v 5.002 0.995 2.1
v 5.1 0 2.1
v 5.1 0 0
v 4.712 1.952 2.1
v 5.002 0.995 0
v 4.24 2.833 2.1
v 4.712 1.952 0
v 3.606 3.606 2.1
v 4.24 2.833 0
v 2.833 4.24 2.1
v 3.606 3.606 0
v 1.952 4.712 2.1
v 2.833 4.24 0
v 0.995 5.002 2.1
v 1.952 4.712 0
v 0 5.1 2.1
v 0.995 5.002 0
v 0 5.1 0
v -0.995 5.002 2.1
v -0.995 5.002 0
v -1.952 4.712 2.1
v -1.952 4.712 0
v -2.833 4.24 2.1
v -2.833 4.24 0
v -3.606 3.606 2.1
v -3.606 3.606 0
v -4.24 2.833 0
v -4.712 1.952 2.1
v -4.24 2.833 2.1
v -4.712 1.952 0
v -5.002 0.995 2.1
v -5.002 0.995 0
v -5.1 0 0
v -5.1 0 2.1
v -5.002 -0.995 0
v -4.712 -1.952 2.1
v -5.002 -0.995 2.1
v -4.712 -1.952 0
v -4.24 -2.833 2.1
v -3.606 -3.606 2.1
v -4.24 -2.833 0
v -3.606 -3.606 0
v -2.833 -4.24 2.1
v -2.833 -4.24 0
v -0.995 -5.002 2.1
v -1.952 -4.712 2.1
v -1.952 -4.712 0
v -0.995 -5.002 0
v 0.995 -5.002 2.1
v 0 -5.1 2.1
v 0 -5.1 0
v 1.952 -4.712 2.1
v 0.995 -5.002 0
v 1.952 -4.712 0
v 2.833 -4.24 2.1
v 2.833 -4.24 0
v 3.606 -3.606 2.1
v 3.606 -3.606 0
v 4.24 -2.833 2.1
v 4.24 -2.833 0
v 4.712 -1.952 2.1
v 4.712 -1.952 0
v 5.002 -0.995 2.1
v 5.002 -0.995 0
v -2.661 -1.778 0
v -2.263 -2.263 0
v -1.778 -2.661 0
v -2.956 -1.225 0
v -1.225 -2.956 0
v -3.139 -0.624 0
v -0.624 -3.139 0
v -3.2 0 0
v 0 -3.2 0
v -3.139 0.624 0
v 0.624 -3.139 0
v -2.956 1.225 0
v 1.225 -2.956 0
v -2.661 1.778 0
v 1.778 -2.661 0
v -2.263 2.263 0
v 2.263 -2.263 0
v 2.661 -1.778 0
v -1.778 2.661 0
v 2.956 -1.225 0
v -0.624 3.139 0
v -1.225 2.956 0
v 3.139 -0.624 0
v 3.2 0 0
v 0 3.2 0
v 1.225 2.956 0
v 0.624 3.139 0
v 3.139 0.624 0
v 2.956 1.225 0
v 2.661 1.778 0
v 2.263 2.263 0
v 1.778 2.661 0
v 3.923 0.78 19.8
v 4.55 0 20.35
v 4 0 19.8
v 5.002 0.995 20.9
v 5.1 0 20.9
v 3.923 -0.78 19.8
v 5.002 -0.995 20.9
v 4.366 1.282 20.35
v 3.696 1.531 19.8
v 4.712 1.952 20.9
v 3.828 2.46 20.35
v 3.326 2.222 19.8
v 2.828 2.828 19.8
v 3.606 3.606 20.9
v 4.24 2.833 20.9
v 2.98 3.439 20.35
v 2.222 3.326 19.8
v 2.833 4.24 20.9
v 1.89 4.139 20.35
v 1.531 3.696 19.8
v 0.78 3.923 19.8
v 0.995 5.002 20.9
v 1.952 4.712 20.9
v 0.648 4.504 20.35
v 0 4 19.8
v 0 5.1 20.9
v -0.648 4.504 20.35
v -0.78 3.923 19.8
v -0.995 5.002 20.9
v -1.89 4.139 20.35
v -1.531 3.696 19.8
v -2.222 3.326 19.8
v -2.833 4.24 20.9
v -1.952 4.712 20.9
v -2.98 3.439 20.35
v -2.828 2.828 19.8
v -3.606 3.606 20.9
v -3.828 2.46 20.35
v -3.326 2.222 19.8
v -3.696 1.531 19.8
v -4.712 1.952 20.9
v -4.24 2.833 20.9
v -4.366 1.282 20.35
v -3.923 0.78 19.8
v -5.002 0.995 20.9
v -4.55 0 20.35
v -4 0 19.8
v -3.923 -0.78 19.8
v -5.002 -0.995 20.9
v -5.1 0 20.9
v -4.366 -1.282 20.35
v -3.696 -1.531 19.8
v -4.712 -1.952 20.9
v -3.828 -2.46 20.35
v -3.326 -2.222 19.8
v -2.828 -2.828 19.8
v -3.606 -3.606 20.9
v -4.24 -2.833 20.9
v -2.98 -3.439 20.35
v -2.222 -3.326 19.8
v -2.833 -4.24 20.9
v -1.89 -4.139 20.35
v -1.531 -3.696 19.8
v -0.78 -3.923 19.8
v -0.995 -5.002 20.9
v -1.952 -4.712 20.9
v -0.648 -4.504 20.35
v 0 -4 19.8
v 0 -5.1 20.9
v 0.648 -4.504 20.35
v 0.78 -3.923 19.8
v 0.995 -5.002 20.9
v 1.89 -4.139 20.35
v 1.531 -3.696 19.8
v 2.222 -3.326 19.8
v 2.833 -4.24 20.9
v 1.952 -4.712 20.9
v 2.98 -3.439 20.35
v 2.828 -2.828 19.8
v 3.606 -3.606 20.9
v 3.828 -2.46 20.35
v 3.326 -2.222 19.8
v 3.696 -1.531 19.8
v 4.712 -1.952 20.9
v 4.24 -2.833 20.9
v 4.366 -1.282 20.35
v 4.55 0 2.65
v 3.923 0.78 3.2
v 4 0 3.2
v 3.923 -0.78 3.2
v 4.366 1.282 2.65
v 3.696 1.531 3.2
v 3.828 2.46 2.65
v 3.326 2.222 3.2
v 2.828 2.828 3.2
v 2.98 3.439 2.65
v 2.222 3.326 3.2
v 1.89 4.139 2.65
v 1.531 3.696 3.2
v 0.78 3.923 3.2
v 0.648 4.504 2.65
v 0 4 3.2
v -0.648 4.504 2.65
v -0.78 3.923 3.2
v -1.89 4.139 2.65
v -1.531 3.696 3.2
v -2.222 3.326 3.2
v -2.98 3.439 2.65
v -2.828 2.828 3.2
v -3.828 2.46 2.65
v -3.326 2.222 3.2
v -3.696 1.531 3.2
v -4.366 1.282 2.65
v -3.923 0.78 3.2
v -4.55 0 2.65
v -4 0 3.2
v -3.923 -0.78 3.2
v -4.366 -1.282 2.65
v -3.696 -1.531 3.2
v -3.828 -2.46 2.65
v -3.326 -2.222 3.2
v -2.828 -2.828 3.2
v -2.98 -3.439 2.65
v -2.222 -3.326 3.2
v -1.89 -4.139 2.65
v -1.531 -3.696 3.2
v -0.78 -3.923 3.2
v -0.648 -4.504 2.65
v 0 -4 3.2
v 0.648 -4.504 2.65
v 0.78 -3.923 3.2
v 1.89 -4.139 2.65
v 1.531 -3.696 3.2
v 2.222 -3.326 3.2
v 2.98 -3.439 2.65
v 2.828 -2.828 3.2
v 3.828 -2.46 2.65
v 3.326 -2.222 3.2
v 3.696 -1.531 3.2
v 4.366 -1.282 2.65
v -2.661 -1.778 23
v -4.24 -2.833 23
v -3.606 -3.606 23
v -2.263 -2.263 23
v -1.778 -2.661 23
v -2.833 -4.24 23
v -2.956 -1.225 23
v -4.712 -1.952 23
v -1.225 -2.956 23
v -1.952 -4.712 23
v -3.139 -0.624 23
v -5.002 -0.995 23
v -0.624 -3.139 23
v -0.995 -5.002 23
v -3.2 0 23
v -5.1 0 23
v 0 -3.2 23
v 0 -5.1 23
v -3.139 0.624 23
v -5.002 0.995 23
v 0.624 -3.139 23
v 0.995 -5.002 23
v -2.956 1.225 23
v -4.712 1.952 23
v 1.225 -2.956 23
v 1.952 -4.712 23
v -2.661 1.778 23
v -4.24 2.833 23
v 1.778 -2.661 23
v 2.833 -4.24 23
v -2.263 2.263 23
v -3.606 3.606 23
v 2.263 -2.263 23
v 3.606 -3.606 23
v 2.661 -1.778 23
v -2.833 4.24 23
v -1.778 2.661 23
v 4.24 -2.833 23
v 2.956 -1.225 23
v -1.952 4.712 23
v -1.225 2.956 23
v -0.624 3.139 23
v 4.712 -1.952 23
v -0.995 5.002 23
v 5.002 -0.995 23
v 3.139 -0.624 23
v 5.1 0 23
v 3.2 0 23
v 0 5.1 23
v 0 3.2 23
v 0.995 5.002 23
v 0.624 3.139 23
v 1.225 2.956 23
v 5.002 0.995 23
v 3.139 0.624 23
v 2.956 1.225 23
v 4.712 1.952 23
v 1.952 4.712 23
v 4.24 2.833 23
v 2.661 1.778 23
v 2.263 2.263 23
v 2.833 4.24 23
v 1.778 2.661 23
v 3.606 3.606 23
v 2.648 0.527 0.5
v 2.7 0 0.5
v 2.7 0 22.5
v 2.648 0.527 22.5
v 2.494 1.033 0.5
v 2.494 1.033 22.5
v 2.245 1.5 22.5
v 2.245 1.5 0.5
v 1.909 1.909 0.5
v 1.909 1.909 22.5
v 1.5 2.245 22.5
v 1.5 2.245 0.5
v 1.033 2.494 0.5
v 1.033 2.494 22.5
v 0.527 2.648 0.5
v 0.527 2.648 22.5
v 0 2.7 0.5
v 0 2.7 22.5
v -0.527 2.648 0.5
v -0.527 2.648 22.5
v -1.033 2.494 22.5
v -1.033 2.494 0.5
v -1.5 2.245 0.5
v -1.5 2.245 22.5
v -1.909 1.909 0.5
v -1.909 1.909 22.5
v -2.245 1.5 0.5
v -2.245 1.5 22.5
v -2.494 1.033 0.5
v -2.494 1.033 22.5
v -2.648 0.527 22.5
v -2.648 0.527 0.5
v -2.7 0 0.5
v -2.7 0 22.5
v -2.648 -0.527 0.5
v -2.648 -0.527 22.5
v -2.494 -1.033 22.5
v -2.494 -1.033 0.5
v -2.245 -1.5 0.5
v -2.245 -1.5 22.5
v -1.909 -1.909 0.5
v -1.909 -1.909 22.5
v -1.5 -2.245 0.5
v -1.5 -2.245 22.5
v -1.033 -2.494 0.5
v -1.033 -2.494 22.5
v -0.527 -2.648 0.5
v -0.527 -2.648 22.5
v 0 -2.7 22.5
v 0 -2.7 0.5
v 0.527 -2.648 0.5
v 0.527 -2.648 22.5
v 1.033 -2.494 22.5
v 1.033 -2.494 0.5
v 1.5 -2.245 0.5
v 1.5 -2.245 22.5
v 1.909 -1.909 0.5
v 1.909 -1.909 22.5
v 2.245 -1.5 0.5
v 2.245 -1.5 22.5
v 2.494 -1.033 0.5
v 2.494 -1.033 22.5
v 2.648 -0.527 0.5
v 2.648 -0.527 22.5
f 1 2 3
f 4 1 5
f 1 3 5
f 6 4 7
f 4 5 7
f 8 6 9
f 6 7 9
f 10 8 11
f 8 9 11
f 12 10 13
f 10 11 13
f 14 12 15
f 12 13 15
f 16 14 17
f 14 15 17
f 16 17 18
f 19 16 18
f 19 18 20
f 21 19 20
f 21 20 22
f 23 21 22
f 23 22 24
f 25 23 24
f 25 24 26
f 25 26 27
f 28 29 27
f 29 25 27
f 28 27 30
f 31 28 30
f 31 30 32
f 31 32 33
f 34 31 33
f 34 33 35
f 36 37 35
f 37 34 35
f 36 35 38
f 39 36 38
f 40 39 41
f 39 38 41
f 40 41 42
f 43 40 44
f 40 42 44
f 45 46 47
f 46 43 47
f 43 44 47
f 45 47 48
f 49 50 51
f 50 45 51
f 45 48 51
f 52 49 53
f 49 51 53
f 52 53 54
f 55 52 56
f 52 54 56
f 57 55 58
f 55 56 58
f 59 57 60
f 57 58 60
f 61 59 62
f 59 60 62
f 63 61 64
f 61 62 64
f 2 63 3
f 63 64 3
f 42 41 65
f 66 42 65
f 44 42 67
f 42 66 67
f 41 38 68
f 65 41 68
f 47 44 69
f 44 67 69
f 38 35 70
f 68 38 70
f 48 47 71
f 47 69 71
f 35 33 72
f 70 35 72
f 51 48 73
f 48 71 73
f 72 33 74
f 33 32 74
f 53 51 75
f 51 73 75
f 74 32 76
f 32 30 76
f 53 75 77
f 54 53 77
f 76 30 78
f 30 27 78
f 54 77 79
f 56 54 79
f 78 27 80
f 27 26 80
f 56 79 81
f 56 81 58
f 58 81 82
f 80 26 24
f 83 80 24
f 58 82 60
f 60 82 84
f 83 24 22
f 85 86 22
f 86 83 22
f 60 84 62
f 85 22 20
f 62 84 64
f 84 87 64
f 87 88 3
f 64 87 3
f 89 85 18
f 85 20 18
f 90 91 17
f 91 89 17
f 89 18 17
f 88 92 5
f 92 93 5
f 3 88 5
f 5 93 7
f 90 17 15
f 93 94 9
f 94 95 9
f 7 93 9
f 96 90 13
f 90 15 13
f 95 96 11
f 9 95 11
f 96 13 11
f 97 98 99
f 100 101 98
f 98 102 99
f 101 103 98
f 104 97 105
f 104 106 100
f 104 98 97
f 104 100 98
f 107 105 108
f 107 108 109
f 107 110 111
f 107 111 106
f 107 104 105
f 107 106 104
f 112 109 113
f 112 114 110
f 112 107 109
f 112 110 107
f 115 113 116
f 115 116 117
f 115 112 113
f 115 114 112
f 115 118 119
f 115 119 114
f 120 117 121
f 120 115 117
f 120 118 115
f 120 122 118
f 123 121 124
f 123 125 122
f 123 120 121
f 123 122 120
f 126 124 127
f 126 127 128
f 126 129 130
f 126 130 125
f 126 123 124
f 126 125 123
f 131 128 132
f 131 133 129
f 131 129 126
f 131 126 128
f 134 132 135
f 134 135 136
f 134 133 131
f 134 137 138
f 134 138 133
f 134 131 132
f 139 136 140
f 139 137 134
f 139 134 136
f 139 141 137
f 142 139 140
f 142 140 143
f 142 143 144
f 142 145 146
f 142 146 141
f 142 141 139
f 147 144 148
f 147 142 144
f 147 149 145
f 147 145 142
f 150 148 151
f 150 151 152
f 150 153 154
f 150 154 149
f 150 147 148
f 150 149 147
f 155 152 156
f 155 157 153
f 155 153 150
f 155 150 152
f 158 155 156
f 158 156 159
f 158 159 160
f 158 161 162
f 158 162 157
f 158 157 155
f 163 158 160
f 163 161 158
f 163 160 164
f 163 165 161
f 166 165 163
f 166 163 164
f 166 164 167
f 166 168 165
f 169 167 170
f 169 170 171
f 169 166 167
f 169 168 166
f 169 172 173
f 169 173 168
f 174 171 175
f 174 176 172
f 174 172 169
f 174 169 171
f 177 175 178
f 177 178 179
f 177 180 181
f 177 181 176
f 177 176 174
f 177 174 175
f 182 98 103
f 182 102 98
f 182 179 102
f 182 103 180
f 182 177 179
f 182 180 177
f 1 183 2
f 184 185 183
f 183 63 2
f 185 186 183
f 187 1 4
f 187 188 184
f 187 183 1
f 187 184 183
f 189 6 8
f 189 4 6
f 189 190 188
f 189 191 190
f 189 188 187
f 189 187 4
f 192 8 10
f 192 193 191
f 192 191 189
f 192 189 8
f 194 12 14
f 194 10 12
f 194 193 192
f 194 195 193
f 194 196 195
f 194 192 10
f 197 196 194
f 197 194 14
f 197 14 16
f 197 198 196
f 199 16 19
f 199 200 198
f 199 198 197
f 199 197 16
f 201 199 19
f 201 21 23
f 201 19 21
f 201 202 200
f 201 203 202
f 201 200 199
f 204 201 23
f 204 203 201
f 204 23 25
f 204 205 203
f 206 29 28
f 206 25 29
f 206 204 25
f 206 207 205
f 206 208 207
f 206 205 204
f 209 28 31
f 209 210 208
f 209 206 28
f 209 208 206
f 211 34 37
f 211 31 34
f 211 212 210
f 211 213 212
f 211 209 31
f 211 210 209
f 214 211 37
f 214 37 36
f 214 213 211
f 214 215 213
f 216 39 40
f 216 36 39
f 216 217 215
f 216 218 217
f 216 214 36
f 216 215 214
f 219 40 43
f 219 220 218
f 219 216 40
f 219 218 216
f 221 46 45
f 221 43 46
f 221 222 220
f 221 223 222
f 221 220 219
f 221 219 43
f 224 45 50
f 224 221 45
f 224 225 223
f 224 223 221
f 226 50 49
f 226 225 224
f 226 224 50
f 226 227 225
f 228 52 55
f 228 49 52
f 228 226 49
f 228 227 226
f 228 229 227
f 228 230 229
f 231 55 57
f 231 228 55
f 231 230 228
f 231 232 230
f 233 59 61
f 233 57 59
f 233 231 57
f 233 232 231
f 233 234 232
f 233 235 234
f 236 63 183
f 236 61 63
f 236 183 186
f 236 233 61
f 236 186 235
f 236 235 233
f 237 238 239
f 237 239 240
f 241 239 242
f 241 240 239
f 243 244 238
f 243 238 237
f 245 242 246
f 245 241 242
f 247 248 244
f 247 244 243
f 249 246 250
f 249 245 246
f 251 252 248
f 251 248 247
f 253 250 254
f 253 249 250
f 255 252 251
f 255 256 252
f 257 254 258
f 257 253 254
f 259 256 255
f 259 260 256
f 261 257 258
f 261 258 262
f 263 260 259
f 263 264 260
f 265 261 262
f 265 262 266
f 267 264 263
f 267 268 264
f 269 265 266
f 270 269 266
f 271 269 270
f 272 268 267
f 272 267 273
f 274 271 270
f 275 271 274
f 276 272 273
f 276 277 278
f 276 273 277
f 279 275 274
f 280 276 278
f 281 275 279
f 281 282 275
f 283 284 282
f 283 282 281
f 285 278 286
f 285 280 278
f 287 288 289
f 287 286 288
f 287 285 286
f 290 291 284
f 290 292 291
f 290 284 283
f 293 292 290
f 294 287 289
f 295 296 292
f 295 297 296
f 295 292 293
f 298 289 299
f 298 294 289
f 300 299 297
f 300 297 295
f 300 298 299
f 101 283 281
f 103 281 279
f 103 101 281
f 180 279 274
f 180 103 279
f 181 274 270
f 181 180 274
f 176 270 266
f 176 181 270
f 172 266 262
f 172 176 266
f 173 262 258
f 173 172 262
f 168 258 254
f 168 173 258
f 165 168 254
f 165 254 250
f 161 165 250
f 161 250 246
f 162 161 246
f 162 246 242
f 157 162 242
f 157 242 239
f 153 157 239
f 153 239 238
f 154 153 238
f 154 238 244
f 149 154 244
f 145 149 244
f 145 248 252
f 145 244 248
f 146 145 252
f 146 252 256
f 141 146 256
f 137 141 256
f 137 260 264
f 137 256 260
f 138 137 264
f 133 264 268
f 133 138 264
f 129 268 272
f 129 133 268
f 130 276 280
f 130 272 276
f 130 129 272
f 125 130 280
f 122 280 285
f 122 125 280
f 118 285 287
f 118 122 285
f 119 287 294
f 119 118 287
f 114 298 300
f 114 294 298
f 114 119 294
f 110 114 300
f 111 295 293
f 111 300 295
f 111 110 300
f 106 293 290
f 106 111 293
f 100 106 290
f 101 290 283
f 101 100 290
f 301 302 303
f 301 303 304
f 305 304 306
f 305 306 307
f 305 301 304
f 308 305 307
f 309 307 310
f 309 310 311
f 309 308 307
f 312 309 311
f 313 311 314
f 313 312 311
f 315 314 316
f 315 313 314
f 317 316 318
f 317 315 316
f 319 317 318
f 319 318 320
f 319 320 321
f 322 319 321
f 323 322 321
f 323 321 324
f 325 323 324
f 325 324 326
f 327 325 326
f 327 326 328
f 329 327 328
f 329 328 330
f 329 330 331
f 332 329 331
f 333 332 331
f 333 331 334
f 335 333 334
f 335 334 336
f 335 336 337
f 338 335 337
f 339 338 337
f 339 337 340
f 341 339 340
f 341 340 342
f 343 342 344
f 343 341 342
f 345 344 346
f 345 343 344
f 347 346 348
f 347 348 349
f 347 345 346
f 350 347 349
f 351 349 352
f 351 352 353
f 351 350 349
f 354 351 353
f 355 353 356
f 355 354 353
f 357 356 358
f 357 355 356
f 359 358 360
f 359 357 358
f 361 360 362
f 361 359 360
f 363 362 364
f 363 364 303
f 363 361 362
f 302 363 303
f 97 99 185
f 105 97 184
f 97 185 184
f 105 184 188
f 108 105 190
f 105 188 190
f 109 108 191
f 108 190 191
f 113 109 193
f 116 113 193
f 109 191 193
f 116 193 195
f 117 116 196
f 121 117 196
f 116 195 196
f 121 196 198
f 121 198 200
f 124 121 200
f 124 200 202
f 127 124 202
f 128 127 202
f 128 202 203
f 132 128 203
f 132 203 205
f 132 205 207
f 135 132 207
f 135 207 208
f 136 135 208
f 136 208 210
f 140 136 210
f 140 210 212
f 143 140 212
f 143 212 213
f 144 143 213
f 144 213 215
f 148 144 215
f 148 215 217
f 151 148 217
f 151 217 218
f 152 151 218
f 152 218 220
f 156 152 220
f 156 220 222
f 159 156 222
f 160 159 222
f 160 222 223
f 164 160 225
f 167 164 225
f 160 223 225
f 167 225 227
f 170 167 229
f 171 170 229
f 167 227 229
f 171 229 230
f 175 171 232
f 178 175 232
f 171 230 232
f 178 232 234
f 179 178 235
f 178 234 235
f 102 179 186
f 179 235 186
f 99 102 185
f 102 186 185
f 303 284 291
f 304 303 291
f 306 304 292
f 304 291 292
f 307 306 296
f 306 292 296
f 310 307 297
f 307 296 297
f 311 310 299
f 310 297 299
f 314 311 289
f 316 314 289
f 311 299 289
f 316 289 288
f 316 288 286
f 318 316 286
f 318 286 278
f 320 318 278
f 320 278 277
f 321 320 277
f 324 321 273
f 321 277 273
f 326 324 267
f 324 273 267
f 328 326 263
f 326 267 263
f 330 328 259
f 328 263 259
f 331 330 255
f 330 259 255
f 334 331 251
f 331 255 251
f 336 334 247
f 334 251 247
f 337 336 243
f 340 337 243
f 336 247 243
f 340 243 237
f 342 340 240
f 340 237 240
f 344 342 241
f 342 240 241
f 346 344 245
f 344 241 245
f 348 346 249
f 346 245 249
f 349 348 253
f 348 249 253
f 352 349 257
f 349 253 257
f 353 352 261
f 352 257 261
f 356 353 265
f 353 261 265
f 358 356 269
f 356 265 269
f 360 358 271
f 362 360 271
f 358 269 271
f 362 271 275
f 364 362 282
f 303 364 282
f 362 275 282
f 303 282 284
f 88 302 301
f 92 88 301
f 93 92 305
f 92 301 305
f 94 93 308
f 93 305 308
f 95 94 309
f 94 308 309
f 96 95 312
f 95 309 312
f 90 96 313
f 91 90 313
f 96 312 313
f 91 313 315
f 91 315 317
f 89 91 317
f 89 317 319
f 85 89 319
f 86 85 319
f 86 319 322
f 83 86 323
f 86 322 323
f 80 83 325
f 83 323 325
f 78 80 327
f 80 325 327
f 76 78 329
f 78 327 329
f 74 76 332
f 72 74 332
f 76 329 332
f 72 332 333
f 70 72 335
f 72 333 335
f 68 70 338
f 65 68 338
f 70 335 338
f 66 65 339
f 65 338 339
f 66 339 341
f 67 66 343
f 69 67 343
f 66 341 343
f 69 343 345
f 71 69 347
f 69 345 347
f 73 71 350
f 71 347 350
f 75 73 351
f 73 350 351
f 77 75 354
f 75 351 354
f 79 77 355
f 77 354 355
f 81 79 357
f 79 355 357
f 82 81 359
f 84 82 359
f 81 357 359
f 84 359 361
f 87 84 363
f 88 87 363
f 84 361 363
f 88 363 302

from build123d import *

# Parameters (mm, degrees)
SKETCH2_R           = 5.1
SKETCH2_R_2         = 2.7
BOSS_EXTRUDE1_DEPTH = 2
SKETCH3_R           = 4
SKETCH3_R_2         = 2.7
BOSS_EXTRUDE2_DEPTH = 19
SKETCH4_R           = 5.1
SKETCH4_R_2         = 2.7
BOSS_EXTRUDE3_DEPTH = 2
CHAMFER1_SIZE       = 1.2
CHAMFER2_SIZE       = 0.5


with BuildPart() as part:
    # Sketch2 → Boss-Extrude1 (new body)
    with BuildSketch(Plane.XY):
        Circle(SKETCH2_R)
        Circle(SKETCH2_R_2, mode=Mode.SUBTRACT)
    extrude(amount=BOSS_EXTRUDE1_DEPTH)

    # Sketch3 → Boss-Extrude2 (add)
    with BuildSketch(Plane.XY.offset(2)):
        Circle(SKETCH3_R)
        Circle(SKETCH3_R_2, mode=Mode.SUBTRACT)
    extrude(amount=BOSS_EXTRUDE2_DEPTH)

    # Sketch4 → Boss-Extrude3 (add)
    with BuildSketch(Plane.XY.offset(21)):
        Circle(SKETCH4_R)
        Circle(SKETCH4_R_2, mode=Mode.SUBTRACT)
    extrude(amount=BOSS_EXTRUDE3_DEPTH)

    # Chamfer1
    # the kernel refuses this chamfer: 1.2 mm, written as the material it adds along each edge
    with BuildSketch(Plane(origin=(0, 0, 21), x_dir=(1, 0, 0), z_dir=(0, -1, 0))) as chamfer1_piece_1_section:
        Polygon((4, -CHAMFER1_SIZE), (4 + CHAMFER1_SIZE, 0), (4, 0), align=None)
    chamfer1_piece_1 = revolve(axis=Axis((0, 0, 21), (0, 0, 1)), mode=Mode.PRIVATE)
    chamfer1_piece_1 = chamfer1_piece_1 & Plane(origin=(0, 0, 20.352695211), x_dir=(1, 0, 0), z_dir=(0, 0, -1)) * Cylinder(5.1, 21, mode=Mode.PRIVATE)
    add(chamfer1_piece_1)
    with BuildSketch(Plane(origin=(0, 0, 2), x_dir=(1, 0, 0), z_dir=(0, -1, 0))) as chamfer1_piece_2_section:
        Polygon((4 + CHAMFER1_SIZE, 0), (4, CHAMFER1_SIZE), (4, 0), align=None)
    chamfer1_piece_2 = revolve(axis=Axis((0, 0, 2), (0, 0, 1)), mode=Mode.PRIVATE)
    chamfer1_piece_2 = chamfer1_piece_2 & Plane(origin=(0, 0, 2.647304789), x_dir=(1, 0, 0), z_dir=(0, 0, -1)) * Cylinder(5.1, 21, mode=Mode.PRIVATE)
    add(chamfer1_piece_2)

    # Chamfer2
    chamfer2_edges = [part.edges().sort_by_distance(p)[0] for p in [
        (-2.7, 0, 23),
        (-2.7, 0, 0),
    ]]
    chamfer(chamfer2_edges, length=CHAMFER2_SIZE)


solid = part.part
